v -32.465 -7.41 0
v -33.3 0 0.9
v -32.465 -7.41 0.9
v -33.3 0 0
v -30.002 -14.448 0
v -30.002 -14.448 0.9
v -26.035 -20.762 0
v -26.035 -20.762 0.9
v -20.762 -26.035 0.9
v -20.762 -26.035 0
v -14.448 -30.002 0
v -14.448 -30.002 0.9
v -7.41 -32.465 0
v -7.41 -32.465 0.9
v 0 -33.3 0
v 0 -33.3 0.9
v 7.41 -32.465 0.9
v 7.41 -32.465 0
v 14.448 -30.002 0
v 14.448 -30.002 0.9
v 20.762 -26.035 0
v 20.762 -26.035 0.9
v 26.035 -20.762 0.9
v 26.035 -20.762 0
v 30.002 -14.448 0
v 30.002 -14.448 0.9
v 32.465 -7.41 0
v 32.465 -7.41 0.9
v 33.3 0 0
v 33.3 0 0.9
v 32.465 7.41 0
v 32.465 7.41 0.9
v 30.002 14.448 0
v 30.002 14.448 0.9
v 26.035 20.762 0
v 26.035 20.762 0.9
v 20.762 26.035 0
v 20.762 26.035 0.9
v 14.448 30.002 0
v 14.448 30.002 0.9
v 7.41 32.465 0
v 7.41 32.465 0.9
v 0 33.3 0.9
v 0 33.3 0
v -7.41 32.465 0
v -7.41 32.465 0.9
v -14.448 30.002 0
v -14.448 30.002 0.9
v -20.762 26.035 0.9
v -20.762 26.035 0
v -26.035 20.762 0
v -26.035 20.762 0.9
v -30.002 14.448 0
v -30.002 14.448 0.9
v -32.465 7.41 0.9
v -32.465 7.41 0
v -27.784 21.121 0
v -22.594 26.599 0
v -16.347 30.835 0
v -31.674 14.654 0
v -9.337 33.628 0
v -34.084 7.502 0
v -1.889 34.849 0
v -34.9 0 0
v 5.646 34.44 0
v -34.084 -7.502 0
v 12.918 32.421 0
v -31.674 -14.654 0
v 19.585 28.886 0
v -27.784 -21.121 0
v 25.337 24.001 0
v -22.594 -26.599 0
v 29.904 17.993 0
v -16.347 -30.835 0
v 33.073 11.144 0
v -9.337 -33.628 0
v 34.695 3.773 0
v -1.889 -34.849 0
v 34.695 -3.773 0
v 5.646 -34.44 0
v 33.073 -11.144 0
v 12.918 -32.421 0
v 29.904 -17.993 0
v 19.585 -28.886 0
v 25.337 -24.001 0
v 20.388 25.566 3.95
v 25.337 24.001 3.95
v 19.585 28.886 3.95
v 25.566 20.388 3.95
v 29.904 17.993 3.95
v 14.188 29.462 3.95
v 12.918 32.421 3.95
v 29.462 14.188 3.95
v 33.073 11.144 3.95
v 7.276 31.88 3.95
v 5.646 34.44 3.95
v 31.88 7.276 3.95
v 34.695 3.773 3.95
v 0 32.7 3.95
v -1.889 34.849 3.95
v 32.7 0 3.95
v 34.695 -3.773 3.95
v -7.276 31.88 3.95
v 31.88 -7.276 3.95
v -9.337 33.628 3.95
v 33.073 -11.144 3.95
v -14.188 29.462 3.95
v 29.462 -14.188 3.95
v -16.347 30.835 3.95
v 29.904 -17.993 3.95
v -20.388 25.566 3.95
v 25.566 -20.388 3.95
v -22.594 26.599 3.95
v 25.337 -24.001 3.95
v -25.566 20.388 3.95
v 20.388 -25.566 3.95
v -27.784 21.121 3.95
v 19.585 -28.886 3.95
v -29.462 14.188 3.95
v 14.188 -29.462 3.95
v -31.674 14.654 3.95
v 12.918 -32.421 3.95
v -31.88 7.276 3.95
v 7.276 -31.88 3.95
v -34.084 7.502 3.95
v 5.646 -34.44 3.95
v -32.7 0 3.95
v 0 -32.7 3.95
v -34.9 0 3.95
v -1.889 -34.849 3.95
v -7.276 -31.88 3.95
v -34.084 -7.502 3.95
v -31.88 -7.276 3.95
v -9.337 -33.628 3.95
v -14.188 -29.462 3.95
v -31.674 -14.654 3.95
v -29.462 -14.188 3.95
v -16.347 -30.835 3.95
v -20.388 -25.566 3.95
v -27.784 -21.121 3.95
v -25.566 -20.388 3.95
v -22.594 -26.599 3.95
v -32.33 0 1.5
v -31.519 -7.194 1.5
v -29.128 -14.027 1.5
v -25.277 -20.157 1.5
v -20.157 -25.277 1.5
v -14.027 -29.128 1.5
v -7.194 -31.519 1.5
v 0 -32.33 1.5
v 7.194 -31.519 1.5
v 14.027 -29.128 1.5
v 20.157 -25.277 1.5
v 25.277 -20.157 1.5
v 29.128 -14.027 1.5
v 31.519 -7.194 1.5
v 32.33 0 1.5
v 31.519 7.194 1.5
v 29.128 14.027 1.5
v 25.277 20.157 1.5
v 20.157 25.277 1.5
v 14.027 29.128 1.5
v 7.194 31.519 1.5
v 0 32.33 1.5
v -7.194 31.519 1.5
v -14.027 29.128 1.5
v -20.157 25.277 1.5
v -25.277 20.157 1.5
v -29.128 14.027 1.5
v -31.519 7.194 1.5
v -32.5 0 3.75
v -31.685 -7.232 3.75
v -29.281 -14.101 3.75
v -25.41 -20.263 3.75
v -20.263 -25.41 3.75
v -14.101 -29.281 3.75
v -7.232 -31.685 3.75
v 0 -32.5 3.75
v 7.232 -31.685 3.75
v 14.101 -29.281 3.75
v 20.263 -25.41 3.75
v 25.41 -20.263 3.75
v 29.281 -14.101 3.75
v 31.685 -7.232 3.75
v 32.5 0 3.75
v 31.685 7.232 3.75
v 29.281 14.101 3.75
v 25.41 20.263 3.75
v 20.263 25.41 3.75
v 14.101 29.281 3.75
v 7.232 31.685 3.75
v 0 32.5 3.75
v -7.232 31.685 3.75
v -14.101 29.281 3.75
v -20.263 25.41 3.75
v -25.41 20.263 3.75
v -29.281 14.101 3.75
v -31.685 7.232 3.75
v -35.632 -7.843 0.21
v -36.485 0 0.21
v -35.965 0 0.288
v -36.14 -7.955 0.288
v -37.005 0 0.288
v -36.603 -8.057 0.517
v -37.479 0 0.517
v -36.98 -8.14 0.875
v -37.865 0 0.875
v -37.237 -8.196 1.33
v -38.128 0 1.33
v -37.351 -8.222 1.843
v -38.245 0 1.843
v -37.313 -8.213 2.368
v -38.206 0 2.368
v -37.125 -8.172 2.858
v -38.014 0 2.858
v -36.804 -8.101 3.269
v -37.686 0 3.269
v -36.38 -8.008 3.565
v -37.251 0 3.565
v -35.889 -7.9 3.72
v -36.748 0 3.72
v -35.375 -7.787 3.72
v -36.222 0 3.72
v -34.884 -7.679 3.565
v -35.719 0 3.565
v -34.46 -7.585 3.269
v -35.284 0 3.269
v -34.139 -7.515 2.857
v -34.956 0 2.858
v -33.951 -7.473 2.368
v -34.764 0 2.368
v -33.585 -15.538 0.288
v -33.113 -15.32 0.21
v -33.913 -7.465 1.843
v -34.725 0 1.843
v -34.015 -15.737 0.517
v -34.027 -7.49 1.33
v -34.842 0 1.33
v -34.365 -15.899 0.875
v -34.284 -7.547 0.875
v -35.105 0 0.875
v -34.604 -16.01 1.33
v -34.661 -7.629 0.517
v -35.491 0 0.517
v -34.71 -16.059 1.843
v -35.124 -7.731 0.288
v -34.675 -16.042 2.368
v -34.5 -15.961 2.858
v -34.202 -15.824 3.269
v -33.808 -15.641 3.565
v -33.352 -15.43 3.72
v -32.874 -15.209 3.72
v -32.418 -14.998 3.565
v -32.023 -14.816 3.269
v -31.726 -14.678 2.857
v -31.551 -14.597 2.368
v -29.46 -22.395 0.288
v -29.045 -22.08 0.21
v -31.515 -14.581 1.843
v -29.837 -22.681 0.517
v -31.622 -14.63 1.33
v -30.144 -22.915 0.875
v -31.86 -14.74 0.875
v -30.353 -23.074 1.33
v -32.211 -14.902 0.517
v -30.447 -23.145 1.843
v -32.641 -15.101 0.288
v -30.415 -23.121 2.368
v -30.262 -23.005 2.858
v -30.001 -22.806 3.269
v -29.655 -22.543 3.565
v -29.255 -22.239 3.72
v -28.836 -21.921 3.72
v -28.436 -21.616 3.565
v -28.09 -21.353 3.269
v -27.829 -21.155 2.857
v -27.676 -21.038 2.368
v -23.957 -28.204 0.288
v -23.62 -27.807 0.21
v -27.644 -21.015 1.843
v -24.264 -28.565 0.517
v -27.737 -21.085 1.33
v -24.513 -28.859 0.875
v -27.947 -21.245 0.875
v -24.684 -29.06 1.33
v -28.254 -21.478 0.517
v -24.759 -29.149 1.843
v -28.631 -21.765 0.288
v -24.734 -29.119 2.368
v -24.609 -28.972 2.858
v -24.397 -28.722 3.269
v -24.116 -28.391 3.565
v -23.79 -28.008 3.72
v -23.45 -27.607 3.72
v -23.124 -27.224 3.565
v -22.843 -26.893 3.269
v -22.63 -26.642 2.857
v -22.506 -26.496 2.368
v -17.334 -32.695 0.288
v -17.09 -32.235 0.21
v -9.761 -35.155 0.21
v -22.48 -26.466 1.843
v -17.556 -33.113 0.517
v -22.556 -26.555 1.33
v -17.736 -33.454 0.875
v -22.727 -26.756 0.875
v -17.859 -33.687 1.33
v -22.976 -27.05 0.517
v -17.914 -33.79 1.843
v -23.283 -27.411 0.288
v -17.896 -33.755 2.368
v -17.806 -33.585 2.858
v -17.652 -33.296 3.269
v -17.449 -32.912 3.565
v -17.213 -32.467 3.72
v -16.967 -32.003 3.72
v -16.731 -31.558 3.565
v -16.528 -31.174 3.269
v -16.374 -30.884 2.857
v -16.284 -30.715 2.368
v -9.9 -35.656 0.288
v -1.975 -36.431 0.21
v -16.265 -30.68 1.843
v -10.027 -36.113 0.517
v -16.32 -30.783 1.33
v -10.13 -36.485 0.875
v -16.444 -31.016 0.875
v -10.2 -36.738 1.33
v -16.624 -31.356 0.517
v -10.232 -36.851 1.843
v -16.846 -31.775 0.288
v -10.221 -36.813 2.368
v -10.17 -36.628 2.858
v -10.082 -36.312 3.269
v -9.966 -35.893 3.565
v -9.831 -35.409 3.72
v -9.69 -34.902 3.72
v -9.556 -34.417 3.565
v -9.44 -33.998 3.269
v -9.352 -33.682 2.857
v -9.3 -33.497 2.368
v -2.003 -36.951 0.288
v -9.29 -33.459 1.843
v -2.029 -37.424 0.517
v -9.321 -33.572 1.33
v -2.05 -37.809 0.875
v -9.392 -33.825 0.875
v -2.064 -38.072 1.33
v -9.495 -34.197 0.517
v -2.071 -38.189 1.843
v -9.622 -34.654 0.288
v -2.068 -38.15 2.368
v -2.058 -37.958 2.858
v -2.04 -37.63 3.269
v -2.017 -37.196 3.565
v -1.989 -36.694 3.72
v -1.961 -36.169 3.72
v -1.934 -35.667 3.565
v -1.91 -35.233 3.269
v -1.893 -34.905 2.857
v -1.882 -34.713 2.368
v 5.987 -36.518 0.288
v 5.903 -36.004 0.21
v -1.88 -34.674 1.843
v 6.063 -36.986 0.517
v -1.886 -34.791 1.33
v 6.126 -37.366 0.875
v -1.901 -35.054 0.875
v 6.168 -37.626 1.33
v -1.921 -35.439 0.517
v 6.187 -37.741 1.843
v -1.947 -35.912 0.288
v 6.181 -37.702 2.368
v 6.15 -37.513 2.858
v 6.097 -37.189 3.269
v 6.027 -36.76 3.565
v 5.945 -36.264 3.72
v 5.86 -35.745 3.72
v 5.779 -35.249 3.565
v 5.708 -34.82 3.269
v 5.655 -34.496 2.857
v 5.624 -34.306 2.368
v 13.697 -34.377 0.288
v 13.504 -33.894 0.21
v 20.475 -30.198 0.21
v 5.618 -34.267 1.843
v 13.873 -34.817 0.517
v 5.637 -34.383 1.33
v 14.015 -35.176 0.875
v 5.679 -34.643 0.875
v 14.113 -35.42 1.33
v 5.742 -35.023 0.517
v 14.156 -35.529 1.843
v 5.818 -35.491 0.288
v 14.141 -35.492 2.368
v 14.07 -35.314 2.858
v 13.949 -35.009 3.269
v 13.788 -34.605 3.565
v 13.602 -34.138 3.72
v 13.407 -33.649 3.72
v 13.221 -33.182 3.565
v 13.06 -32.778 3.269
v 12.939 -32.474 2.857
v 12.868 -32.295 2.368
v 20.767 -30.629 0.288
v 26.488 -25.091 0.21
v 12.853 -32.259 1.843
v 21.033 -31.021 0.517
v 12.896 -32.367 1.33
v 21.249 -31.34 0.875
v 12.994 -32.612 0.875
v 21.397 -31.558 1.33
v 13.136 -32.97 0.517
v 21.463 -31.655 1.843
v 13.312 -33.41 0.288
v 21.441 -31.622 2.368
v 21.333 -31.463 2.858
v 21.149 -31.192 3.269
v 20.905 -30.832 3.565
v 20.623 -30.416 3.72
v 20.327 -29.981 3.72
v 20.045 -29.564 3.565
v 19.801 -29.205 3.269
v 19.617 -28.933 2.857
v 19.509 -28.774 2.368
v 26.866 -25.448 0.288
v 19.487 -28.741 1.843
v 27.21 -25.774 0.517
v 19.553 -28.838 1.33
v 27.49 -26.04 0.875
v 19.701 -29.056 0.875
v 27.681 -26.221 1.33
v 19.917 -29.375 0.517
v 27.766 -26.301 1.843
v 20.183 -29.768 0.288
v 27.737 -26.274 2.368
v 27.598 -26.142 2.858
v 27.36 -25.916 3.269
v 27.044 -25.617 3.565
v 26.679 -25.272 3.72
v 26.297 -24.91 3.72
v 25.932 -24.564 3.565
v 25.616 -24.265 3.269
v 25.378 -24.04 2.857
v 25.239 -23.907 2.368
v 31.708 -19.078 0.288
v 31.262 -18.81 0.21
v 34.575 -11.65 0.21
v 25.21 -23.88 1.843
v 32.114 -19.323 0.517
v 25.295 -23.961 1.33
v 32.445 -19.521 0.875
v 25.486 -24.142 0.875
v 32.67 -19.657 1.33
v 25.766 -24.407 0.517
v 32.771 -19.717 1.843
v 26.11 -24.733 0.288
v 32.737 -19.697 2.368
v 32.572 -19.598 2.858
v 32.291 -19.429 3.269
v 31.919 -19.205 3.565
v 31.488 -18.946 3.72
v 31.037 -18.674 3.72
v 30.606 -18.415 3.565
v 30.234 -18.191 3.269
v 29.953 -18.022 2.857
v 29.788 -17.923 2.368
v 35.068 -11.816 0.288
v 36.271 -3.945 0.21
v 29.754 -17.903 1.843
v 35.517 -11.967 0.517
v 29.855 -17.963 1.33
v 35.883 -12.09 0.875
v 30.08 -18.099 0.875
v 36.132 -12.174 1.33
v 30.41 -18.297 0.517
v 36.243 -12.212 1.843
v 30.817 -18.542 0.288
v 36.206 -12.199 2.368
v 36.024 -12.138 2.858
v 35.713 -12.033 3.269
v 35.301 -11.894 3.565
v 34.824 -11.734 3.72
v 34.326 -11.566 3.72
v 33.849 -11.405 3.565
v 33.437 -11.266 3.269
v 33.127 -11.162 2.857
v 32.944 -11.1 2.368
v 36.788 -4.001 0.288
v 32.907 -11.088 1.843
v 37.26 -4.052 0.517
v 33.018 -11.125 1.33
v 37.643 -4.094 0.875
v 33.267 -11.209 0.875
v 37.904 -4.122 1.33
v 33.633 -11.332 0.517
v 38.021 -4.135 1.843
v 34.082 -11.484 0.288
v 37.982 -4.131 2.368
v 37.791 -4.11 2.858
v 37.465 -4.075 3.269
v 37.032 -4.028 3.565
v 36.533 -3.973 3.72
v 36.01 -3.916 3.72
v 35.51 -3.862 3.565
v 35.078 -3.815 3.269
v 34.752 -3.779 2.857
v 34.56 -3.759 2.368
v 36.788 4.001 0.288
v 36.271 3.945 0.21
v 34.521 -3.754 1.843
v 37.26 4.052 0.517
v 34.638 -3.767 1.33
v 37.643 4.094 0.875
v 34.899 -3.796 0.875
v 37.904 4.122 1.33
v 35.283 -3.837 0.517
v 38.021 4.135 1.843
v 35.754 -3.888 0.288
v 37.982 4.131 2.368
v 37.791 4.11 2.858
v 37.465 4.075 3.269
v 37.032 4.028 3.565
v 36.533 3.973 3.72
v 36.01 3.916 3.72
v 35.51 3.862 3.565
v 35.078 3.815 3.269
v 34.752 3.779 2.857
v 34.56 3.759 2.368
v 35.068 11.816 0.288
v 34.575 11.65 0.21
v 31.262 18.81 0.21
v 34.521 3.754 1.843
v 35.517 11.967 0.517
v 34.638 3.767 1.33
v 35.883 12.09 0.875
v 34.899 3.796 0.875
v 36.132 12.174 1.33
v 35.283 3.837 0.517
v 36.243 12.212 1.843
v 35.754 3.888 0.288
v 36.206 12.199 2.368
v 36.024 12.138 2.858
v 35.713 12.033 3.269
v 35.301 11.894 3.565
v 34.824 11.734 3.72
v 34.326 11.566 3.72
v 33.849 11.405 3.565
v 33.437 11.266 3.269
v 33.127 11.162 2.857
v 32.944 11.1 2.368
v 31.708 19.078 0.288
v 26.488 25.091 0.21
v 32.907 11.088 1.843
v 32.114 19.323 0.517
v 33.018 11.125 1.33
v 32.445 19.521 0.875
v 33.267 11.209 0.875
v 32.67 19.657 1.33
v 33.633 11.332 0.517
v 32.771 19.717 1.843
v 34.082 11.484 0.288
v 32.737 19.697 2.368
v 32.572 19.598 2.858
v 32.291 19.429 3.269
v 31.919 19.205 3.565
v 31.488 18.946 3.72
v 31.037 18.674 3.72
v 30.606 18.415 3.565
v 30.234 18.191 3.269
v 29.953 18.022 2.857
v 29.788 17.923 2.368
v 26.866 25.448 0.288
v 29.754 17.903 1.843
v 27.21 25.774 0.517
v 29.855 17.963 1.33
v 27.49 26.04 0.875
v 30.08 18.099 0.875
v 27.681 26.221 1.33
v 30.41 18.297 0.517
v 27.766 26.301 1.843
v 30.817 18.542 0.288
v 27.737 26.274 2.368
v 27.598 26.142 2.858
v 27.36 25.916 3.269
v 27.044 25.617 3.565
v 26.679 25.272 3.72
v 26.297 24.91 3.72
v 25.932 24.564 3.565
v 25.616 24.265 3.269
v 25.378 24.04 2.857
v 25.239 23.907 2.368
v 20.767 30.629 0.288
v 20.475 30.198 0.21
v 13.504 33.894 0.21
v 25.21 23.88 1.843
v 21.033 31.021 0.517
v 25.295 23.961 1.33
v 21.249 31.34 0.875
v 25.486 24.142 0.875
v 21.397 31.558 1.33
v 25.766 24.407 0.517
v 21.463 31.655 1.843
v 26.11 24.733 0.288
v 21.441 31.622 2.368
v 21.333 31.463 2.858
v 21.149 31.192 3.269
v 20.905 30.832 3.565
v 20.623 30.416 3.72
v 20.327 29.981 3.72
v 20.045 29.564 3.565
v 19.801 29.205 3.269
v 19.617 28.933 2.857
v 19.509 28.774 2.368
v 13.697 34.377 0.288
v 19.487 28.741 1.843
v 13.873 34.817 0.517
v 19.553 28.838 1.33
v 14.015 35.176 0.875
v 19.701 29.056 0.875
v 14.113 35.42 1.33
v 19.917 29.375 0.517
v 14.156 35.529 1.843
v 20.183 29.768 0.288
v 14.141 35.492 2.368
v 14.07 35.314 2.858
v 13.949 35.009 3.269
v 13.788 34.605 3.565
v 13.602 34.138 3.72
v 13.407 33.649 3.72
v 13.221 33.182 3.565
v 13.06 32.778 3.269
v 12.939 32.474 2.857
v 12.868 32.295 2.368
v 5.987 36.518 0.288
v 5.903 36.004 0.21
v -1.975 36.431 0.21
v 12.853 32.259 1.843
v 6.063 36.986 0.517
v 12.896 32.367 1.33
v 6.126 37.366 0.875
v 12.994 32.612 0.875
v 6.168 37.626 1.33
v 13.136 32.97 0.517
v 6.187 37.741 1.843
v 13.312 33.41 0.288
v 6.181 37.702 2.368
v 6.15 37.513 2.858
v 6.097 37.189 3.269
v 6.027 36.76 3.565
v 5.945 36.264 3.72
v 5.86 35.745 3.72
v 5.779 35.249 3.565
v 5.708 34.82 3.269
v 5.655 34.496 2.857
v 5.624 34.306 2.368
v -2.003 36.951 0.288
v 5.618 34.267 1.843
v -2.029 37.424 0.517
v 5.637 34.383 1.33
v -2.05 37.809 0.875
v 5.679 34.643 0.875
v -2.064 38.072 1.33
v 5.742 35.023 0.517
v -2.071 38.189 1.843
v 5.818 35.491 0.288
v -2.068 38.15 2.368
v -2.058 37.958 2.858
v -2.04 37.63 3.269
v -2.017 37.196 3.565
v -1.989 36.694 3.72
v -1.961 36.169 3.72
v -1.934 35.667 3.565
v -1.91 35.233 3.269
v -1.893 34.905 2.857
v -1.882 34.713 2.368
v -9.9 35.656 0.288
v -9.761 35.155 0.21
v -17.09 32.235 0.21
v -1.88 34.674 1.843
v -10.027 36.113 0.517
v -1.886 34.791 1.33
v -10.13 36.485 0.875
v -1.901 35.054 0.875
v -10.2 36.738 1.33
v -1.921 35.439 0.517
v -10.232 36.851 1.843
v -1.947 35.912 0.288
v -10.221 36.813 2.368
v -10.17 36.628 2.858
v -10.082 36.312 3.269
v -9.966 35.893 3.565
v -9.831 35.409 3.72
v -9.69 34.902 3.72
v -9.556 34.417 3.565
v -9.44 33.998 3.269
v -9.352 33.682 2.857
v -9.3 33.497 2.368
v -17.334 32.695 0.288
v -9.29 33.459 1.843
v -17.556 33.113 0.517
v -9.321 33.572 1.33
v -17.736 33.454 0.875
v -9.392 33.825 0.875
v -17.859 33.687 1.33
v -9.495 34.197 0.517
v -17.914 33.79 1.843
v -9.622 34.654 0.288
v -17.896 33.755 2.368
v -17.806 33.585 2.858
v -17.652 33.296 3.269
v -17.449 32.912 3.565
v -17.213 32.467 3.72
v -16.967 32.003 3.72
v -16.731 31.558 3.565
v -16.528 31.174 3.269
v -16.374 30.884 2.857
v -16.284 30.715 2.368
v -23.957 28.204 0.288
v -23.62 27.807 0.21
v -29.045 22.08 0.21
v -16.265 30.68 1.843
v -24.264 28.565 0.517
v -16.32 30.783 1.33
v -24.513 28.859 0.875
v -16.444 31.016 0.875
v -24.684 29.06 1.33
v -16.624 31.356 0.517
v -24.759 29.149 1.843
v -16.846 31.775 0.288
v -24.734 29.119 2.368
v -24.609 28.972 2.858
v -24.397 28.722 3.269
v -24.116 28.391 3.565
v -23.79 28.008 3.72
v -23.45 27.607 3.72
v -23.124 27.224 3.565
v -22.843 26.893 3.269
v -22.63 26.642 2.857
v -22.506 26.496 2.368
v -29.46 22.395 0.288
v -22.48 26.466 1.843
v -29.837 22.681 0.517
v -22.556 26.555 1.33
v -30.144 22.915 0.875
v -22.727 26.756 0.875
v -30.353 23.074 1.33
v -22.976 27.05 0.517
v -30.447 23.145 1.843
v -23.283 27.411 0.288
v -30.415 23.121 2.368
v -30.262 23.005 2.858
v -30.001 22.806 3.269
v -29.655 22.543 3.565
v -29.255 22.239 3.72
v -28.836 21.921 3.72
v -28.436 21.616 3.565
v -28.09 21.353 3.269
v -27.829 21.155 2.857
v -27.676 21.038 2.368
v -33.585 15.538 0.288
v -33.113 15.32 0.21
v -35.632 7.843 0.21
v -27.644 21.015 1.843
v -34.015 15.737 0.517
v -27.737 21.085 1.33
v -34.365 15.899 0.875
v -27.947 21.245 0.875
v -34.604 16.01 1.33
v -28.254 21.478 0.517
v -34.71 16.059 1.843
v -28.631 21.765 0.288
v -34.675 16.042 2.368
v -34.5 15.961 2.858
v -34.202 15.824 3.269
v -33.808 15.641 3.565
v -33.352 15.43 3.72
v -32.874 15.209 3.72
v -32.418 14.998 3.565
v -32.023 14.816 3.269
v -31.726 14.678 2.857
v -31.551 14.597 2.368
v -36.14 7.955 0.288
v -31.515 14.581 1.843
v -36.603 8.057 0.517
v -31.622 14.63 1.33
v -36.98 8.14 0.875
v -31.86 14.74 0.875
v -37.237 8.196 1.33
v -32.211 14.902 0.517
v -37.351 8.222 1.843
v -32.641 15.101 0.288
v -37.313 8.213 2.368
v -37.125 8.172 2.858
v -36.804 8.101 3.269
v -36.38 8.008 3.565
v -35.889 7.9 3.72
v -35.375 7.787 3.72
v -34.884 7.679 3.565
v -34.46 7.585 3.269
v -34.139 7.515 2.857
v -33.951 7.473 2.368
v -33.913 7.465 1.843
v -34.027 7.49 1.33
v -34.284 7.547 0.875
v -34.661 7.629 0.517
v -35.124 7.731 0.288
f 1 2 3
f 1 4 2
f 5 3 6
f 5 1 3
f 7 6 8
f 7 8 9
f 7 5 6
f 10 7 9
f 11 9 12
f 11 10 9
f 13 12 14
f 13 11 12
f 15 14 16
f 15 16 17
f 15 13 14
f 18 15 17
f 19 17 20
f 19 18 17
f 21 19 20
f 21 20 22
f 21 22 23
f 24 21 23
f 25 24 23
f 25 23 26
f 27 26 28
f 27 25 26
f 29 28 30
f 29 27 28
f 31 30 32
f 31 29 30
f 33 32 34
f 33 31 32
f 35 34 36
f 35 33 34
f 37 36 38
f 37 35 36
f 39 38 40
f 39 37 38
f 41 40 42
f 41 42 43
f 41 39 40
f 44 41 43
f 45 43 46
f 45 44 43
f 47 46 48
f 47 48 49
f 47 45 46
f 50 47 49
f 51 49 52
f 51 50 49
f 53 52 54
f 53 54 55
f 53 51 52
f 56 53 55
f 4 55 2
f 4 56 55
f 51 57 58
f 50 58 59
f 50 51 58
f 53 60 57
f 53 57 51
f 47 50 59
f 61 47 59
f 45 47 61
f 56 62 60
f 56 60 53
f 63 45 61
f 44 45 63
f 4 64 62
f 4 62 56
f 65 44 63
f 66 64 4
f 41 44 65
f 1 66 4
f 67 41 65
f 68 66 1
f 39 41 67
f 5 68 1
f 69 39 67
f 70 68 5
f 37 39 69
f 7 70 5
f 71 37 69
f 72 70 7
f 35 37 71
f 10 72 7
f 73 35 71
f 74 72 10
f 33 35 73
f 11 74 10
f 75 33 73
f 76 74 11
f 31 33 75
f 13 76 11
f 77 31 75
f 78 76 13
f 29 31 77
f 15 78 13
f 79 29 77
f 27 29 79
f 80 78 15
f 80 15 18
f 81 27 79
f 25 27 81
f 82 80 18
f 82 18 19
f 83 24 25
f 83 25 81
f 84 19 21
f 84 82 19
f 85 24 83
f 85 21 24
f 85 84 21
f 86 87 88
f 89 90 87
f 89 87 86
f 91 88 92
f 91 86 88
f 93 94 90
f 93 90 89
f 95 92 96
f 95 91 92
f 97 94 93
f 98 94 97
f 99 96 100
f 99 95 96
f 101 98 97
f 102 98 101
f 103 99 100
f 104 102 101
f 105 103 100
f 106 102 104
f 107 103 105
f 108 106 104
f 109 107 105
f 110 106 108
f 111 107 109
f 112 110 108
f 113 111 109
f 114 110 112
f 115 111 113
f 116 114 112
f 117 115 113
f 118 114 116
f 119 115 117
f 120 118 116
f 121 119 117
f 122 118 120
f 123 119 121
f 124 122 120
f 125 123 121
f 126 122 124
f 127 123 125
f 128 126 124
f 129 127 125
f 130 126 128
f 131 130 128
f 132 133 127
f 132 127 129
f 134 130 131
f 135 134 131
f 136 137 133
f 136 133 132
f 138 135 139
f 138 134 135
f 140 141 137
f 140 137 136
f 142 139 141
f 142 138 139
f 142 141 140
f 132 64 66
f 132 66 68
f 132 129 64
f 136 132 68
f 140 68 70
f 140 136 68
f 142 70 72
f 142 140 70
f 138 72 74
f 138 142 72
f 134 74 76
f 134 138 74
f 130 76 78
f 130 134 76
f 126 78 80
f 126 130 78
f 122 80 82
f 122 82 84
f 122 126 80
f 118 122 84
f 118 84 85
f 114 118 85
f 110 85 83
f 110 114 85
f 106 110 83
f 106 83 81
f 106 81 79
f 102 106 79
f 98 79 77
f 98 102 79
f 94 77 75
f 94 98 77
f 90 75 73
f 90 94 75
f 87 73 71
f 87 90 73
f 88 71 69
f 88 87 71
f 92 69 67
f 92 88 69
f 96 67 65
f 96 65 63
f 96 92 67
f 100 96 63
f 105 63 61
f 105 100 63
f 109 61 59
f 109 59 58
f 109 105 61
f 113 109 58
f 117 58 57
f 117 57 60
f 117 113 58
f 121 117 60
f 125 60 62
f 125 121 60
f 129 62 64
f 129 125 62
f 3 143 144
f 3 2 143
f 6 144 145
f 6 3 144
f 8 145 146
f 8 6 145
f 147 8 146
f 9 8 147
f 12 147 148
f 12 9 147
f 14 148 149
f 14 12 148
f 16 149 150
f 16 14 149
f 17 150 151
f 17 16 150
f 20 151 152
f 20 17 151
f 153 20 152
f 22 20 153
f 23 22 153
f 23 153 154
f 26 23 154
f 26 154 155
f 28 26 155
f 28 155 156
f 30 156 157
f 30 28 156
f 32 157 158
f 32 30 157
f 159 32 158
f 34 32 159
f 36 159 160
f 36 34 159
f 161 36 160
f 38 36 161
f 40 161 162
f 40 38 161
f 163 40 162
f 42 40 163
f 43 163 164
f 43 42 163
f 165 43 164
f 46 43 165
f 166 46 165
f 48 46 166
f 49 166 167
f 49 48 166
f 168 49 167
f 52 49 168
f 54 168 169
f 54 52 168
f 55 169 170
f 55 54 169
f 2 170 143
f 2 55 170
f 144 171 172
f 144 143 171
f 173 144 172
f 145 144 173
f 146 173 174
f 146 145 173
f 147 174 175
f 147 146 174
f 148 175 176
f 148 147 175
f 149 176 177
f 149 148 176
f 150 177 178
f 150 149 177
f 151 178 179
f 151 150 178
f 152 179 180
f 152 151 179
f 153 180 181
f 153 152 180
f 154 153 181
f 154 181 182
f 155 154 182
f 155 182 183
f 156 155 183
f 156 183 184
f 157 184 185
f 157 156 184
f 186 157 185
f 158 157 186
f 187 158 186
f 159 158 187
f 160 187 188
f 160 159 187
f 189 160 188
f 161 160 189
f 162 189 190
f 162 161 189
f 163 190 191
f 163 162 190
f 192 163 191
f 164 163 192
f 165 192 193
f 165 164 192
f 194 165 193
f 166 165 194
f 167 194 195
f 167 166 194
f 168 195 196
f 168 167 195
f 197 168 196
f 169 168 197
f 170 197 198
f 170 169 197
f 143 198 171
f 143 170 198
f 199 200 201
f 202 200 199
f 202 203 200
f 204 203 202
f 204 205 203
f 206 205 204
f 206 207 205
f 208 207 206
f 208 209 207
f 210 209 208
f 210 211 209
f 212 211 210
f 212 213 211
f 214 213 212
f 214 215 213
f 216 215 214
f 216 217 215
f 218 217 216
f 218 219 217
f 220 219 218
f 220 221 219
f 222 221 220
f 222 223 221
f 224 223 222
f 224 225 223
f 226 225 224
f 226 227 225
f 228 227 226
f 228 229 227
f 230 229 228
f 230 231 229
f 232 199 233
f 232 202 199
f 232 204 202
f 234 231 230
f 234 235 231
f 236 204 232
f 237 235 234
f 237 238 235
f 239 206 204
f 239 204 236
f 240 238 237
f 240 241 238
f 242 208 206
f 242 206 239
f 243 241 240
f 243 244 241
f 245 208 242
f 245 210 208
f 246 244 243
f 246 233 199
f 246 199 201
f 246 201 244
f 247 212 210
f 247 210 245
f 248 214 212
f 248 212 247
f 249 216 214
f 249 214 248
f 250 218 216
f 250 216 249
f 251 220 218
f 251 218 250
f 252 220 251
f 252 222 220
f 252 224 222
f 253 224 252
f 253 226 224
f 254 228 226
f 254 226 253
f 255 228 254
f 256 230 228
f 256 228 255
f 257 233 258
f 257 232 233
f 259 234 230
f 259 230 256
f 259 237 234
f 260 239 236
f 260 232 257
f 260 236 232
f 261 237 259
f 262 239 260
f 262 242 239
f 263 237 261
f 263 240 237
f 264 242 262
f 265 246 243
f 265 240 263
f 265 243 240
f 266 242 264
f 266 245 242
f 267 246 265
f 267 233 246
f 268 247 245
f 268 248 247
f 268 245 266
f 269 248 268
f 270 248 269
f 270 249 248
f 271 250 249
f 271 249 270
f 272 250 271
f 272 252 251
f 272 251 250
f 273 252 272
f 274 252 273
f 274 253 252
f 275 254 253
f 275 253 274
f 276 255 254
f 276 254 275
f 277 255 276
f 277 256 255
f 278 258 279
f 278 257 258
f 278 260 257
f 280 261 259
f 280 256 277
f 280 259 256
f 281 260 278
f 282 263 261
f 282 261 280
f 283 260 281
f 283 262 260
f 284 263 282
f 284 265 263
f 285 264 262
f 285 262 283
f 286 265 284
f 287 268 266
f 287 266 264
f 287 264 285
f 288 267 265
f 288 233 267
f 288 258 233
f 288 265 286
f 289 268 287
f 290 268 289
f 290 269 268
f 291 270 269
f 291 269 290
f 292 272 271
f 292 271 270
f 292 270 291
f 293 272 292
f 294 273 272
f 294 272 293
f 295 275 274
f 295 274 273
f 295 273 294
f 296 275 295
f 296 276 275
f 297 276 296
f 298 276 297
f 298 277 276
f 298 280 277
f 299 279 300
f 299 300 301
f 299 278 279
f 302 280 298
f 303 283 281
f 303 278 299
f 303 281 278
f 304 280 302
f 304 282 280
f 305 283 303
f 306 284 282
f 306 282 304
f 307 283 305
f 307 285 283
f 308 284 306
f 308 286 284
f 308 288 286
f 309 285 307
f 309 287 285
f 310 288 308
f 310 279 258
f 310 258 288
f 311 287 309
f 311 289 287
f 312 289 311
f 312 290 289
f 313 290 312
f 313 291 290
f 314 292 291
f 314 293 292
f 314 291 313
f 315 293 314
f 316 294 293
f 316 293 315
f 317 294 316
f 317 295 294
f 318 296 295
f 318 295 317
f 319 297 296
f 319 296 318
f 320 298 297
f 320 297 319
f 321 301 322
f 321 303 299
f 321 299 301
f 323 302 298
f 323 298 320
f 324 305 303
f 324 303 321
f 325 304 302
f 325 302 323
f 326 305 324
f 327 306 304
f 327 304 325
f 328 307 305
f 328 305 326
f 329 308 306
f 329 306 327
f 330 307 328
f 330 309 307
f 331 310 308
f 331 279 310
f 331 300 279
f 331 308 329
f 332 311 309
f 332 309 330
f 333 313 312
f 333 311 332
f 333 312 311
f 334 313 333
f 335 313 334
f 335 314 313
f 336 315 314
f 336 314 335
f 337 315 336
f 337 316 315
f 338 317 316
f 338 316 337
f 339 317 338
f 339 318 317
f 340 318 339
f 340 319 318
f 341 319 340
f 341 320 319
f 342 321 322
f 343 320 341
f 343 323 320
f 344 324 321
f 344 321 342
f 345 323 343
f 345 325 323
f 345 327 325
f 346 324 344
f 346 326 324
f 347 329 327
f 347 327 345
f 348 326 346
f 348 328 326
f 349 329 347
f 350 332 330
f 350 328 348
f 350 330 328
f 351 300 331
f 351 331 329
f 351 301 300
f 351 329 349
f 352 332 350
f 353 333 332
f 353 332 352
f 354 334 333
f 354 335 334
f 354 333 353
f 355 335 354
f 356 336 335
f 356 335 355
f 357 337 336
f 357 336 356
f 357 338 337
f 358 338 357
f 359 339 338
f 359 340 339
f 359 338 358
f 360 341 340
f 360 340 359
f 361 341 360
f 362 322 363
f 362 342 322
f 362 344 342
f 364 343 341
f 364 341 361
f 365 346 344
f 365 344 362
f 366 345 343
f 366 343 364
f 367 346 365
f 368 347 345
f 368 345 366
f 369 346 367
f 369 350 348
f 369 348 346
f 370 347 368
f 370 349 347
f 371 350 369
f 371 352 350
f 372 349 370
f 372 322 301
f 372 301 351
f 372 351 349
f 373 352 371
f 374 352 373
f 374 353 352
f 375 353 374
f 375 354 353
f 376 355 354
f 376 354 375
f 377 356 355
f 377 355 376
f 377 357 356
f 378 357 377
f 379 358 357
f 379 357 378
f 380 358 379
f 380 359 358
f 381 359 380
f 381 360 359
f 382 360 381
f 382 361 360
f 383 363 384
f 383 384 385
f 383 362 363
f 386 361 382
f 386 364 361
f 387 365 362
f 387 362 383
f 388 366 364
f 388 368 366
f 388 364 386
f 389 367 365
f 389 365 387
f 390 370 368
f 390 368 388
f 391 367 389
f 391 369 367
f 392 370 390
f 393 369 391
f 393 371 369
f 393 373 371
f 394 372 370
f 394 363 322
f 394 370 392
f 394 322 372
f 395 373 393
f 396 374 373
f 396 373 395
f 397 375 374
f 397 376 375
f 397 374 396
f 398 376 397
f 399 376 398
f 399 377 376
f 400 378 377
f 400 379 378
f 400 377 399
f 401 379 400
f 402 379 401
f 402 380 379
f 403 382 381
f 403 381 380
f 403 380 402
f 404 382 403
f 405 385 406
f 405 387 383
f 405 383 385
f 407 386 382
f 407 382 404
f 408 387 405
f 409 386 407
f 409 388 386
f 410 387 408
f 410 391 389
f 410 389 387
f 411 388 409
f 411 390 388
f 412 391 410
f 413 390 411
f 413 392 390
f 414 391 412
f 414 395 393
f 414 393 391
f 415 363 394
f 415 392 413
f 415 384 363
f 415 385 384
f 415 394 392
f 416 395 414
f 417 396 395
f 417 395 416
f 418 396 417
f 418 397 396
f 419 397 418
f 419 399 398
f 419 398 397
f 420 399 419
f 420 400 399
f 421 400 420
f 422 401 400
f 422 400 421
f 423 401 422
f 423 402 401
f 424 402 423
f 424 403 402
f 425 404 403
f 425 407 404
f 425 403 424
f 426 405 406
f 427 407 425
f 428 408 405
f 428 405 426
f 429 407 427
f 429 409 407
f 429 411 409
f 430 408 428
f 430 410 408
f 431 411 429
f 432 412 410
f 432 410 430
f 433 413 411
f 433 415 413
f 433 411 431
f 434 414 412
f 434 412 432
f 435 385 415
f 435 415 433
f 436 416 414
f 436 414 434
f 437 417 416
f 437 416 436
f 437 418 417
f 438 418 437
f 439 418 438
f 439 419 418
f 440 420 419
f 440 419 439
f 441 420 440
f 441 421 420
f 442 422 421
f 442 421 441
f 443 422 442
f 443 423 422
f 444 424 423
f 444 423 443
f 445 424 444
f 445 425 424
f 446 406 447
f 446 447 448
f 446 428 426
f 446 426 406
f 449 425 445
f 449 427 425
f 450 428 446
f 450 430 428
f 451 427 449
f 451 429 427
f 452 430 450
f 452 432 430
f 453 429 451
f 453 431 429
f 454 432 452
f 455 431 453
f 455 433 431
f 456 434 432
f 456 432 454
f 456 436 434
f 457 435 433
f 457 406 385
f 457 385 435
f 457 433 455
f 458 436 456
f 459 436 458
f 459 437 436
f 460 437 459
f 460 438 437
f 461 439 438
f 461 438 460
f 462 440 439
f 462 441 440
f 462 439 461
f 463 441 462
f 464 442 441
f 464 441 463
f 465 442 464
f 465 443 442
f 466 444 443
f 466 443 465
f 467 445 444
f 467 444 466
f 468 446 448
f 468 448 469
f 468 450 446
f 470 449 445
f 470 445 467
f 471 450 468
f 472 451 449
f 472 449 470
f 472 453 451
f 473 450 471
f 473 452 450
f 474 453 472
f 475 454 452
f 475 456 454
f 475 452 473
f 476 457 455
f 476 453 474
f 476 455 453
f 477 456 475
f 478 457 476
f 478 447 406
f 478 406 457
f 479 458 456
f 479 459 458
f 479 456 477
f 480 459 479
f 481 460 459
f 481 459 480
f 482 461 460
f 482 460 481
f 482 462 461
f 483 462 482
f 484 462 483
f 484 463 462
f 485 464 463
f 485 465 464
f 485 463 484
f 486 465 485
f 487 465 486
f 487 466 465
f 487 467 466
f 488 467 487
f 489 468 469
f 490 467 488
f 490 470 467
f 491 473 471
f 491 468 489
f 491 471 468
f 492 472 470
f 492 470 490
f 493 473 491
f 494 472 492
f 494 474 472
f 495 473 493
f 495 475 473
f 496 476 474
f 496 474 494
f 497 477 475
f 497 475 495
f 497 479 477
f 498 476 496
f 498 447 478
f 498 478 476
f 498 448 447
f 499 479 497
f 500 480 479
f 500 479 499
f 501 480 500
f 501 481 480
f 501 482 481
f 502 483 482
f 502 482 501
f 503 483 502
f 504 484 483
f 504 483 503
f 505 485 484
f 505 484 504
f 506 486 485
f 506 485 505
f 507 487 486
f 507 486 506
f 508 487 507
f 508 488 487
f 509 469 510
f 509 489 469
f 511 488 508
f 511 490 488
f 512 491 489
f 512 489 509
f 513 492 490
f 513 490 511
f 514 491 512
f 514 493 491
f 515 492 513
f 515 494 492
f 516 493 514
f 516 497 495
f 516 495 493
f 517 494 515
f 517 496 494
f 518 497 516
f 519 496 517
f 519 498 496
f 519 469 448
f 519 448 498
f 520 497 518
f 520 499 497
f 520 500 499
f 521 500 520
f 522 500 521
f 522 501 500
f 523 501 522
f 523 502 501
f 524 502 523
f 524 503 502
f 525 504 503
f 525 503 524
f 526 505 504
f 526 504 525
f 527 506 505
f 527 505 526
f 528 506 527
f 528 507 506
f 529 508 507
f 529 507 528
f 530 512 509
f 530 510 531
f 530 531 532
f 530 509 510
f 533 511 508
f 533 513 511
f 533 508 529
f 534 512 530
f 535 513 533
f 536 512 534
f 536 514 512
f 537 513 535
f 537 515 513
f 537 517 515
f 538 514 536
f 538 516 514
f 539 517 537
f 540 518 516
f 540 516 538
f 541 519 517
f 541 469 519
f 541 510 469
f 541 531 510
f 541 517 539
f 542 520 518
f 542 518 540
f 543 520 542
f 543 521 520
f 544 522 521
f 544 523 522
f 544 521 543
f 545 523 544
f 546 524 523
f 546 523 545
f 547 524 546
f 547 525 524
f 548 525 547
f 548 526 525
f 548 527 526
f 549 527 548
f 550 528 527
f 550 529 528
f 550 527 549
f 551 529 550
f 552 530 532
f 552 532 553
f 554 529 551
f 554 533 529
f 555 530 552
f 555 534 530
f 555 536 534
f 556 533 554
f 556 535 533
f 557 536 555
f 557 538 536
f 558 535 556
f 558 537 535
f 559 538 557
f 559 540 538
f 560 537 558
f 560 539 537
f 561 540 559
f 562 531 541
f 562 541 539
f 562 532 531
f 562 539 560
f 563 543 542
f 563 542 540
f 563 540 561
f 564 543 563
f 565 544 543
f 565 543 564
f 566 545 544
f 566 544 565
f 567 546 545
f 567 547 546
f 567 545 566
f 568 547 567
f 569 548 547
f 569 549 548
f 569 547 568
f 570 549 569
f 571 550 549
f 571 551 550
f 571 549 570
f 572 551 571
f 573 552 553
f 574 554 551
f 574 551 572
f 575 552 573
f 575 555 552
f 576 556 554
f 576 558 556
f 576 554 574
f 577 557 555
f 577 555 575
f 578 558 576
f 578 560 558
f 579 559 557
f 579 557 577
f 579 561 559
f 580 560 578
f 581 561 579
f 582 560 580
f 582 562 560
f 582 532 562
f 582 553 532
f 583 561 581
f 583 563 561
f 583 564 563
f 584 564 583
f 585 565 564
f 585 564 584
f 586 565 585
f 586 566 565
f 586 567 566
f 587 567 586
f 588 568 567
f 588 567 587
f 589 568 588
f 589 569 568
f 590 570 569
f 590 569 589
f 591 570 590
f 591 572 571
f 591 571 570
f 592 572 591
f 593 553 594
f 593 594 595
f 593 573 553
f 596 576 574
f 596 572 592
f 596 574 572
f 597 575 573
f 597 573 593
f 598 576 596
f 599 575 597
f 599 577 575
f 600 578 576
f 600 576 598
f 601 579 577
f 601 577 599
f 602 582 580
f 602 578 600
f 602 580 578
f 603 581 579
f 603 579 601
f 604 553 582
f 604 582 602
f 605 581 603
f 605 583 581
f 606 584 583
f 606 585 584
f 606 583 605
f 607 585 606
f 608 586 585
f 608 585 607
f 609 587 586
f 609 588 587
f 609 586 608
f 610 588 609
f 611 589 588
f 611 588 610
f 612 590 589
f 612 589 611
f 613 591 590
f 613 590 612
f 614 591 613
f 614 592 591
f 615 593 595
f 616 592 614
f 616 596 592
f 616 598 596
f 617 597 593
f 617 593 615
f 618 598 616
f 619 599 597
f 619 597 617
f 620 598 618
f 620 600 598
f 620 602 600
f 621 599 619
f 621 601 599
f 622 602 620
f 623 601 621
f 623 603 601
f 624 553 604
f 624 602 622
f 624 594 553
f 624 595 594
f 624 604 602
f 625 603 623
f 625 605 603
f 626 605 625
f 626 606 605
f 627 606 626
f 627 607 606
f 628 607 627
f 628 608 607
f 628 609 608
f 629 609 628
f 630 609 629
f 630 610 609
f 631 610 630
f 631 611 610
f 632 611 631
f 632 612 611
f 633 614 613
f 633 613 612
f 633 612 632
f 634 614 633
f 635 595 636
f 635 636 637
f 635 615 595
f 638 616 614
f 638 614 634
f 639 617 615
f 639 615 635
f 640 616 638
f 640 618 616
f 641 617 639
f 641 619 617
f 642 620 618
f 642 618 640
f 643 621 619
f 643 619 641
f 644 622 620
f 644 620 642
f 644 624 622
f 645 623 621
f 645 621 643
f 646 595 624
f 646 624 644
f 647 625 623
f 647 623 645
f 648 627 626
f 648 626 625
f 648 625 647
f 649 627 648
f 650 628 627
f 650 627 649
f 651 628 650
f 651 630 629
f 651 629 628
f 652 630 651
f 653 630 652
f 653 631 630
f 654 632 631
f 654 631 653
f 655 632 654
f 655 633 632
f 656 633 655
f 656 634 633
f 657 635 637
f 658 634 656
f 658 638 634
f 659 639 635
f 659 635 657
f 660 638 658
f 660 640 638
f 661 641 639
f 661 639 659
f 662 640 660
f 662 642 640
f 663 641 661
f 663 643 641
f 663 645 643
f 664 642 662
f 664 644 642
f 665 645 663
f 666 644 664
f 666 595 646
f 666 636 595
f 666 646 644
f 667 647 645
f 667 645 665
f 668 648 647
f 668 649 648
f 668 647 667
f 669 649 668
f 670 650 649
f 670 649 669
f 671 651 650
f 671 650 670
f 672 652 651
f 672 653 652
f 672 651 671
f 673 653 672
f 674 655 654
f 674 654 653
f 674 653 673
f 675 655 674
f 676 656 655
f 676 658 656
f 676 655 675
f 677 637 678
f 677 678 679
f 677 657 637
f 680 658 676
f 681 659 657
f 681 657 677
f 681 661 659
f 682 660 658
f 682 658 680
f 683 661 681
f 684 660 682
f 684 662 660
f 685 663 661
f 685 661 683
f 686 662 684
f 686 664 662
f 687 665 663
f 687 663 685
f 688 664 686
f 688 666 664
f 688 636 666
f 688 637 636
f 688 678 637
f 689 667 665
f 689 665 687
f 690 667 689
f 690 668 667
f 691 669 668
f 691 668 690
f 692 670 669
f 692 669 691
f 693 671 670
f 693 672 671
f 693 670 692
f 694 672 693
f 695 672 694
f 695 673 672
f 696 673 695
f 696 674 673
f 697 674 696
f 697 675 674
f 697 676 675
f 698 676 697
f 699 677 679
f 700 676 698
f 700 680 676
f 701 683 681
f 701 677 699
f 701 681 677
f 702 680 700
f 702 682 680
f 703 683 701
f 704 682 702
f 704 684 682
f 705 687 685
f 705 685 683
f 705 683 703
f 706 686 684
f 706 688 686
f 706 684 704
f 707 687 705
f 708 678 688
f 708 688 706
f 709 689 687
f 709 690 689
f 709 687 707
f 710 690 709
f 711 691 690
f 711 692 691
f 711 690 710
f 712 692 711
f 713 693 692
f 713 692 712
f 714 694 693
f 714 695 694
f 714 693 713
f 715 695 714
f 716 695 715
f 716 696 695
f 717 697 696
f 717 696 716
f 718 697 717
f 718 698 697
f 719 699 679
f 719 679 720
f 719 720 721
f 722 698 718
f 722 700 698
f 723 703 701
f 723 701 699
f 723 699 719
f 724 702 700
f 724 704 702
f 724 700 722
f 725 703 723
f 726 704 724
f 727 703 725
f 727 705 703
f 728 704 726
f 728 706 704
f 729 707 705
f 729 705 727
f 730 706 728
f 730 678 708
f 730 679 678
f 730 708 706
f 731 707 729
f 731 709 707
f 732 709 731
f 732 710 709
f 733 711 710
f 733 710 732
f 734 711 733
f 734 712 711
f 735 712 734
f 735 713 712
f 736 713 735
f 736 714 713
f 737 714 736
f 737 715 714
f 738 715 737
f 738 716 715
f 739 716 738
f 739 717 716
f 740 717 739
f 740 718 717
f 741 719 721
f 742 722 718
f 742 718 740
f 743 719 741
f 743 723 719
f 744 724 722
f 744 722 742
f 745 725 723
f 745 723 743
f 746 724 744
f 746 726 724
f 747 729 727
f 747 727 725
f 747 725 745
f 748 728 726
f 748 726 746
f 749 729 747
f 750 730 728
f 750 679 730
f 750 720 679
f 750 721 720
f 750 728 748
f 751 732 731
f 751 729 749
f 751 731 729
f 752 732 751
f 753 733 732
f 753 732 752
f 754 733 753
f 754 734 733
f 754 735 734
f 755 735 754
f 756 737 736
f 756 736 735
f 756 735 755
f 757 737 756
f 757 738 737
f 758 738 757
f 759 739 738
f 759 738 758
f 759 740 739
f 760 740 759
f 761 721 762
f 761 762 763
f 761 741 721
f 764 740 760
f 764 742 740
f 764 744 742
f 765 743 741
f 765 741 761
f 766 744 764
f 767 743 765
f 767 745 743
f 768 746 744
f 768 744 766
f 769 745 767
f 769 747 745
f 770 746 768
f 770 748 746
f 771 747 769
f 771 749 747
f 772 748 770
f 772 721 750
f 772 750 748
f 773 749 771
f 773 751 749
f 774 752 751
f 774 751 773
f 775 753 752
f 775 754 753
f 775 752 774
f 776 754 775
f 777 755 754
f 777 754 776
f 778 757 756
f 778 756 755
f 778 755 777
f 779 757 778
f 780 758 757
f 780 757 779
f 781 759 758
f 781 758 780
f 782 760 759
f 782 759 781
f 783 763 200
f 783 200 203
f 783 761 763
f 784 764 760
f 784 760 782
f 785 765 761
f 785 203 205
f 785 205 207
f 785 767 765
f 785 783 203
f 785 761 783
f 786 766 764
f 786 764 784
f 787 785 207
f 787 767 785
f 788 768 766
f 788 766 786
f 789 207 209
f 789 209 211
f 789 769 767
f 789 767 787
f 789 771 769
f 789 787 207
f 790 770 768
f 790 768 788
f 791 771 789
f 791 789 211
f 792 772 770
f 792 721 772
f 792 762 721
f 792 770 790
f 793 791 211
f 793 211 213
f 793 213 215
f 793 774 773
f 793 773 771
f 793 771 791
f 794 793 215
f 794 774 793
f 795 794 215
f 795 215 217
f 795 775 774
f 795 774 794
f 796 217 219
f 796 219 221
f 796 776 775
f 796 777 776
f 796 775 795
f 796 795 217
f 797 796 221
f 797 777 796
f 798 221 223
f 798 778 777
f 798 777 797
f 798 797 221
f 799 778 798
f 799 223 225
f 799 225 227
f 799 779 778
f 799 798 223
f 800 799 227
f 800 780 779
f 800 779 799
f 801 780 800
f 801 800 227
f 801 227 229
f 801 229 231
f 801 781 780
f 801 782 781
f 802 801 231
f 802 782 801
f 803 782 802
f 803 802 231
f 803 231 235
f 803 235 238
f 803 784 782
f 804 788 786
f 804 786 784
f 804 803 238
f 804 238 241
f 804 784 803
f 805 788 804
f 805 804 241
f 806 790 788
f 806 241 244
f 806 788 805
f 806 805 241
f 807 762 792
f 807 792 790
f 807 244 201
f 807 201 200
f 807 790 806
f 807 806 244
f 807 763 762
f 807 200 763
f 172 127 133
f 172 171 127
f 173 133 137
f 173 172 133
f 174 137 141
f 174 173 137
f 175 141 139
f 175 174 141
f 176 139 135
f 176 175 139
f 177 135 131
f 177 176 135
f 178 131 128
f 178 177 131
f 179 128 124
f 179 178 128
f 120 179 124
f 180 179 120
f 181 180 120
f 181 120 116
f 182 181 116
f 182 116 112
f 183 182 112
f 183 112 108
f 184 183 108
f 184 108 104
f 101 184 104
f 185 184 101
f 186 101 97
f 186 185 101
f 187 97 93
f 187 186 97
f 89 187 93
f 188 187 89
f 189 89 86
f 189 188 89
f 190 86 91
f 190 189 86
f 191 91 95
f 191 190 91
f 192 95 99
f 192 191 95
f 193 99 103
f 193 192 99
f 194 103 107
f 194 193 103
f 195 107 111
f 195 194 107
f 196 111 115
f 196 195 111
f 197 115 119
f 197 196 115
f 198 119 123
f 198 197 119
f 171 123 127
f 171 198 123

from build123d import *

# Parameters (mm, degrees)
SKETCH4_R = 1.765


with BuildPart() as part:
    # Sketch1 → Revolve1 (revolve)
    with BuildSketch(Plane(origin=(0, 0, 0), x_dir=(0, 0, -1), z_dir=(1, 0, 0))):
        Polygon((0, 33.3), (0, 34.9), (-3.95, 34.9), (-3.95, 32.7), (-3.75, 32.5), (-1.5, 32.33), (-0.9, 33.3), align=None)
    revolve(axis=Axis((0, 0, 0), (0, 0, 1)))


with BuildPart() as body_2:
    # Sketch4 → Revolve2 (revolve)
    with BuildSketch(Plane(origin=(0, 0, 0), x_dir=(0, 0, -1), z_dir=(1, 0, 0))):
        with Locations((-1.975, 36.485)):
            Circle(SKETCH4_R)
    revolve(axis=Axis((0, 0, 0), (0, 0, 1)))


solid = Compound([part.part, body_2.part])
